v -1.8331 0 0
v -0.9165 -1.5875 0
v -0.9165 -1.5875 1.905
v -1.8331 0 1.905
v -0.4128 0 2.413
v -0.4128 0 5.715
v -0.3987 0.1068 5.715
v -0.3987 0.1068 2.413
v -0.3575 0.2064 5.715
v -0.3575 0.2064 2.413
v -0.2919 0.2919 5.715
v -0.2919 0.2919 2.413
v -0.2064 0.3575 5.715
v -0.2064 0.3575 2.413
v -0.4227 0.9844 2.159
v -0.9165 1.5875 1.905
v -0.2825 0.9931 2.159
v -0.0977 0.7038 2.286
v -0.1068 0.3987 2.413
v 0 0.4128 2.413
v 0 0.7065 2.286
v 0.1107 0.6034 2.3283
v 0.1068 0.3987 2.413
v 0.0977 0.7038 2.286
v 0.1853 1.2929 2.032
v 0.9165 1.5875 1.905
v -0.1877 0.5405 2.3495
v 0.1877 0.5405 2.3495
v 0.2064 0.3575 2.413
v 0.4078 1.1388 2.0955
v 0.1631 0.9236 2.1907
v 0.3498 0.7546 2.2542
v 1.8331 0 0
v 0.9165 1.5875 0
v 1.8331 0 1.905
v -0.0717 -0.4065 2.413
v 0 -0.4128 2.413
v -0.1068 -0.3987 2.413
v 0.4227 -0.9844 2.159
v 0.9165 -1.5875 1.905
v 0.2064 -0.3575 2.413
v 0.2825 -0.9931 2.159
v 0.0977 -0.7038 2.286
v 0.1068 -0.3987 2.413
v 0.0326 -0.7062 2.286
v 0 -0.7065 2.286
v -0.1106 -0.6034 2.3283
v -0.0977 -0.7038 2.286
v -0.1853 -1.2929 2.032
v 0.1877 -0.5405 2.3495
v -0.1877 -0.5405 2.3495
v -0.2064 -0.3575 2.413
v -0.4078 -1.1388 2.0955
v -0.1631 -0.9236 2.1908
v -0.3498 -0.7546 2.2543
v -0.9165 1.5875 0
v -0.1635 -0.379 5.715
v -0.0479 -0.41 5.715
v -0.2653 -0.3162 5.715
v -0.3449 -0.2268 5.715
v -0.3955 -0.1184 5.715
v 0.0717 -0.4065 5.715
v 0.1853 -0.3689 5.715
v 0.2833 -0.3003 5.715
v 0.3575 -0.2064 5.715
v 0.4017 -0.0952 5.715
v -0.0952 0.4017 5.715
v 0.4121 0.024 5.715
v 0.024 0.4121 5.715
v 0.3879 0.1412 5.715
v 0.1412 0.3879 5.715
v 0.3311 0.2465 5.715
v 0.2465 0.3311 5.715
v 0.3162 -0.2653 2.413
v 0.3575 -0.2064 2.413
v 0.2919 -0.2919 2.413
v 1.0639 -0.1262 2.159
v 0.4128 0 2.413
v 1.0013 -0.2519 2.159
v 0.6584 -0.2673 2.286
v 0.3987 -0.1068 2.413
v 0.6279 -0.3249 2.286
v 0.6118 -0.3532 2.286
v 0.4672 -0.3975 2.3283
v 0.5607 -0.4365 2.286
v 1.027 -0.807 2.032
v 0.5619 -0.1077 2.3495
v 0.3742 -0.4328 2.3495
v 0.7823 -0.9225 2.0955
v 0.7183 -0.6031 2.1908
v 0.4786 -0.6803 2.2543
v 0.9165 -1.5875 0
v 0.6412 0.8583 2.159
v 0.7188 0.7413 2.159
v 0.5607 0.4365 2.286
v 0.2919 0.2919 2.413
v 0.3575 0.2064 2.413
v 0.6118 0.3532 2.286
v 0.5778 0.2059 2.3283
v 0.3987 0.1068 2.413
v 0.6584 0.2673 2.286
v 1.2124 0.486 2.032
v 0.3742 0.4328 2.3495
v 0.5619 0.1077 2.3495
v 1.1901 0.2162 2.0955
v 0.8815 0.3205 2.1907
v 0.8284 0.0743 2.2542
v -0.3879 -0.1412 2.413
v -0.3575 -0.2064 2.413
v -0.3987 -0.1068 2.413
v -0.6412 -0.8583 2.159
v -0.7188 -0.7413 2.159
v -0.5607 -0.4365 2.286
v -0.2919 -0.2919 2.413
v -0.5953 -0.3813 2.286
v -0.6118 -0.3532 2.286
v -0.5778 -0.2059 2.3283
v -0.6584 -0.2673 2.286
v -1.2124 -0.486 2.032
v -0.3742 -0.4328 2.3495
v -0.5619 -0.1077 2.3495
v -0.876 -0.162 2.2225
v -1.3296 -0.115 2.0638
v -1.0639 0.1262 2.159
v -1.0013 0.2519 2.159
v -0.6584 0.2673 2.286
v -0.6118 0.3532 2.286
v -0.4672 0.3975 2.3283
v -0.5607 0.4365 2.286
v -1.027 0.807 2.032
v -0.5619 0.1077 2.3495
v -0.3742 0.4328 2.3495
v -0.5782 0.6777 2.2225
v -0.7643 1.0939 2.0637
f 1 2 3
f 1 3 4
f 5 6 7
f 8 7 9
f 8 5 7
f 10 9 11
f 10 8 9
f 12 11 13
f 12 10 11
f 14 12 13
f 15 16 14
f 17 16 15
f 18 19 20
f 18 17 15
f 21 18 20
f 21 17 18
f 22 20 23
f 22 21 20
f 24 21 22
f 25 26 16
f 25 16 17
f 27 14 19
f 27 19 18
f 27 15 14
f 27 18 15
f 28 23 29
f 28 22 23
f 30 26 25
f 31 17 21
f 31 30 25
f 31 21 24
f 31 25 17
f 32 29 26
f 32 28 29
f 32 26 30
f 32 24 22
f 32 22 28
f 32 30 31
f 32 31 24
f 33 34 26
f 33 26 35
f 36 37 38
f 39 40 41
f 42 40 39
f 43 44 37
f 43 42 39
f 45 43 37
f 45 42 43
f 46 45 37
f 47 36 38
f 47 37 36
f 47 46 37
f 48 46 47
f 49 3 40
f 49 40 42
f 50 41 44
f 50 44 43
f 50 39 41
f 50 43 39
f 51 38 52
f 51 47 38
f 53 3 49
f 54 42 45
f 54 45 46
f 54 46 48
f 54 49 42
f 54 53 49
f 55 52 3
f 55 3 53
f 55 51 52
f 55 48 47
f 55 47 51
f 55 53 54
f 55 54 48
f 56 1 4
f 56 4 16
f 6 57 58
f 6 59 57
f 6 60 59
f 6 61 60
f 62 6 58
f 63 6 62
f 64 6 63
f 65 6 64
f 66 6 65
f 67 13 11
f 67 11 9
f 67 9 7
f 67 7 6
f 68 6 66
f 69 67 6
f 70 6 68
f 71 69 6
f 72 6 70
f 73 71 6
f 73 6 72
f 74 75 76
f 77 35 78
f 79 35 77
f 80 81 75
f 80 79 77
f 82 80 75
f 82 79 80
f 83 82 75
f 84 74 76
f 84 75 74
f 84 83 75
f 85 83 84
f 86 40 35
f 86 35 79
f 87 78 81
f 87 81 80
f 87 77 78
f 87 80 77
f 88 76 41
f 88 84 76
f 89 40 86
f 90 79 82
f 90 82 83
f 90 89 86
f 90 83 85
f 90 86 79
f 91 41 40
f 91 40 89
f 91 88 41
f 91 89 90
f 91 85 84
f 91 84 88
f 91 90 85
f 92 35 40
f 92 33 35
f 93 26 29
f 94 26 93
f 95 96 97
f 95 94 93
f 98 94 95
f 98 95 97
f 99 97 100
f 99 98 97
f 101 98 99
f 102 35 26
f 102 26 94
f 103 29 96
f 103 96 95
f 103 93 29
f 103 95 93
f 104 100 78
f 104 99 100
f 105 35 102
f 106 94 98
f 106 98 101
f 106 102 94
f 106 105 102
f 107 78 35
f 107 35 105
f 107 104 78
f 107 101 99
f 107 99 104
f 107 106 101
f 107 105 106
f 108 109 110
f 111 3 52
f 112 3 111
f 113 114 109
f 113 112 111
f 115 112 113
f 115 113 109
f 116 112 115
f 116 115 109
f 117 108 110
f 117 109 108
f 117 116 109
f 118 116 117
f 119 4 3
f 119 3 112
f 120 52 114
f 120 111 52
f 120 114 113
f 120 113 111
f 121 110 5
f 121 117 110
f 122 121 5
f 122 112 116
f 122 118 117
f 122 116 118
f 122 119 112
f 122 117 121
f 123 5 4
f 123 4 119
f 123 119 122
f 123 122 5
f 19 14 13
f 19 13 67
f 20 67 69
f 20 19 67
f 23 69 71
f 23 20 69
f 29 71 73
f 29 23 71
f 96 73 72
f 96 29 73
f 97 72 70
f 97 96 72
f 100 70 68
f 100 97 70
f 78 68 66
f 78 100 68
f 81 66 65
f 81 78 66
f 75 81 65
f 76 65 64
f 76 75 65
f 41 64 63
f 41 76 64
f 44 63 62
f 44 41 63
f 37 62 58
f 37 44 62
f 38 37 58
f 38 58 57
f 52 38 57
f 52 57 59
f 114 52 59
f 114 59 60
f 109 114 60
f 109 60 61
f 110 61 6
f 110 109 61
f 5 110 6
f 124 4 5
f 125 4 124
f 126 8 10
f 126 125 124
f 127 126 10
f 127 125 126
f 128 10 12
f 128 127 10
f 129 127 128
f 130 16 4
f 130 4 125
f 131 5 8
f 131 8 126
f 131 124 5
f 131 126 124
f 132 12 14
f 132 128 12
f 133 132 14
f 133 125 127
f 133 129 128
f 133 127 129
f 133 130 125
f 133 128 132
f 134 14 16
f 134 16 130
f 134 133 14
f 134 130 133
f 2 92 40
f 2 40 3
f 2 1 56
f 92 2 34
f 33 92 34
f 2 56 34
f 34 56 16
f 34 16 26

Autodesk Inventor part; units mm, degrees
ref_plane "YZ Plane" through (0, 0, 0) normal (1, 0, 0) x (0, 1, 0)
ref_plane "XZ Plane" through (0, 0, 0) normal (0, 1, 0) x (-1, 0, 0)
ref_plane "XY Plane" through (0, 0, 0) normal (0, 0, 1) x (1, 0, 0)
sketch "Sketch1" plane through (0, 0, 0) normal (0, 0, 1) x (1, 0, 0)
  line L0 (-1.8331, 0) -> (-0.9165, 1.5875)
  line L1 (-0.9165, 1.5875) -> (0.9165, 1.5875)
  line L2 (0.9165, 1.5875) -> (1.8331, 0)
  line L3 (1.8331, 0) -> (0.9165, -1.5875)
  line L4 (0.9165, -1.5875) -> (-0.9165, -1.5875)
  line L5 (-0.9165, -1.5875) -> (-1.8331, 0)
  line L6 (0, -1.5875) -> (0, 1.5875) construction
  point P0 (0, 0)
  dimension "d1" = 0
  dimension "d3" = 120
  dimension "d7" = 3.175
extrude "Extrusion1" add sketch "Sketch1" along normal blind 1.905
sketch "Sketch2" plane through (0, 0, 1.905) normal (0, 0, 1) x (1, 0, 0)
  circle A0 centre (0, 0) radius 0.4128
  dimension "d6" = 0.8255
extrude "Extrusion2" add sketch "Sketch2" along normal blind 0.508
loft "Loft1" add section 1 edges at (-0.4128, 0, 2.413) section 2 edges at (0, -1.5875, 1.905) (1.3748, -0.7937, 1.905) (1.3748, 0.7938, 1.905) (0, 1.5875, 1.905) (-1.3748, 0.7937, 1.905) (-1.3748, -0.7938, 1.905)
sketch "Sketch3" plane through (0, 0, 2.413) normal (0, 0, 1) x (1, 0, 0)
  arc A0 (-0.2064, 0.3575) -> (-0.4128, 0) centre (0, 0) ccw projected
  circle A1 centre (0, 0) radius 0.4128
  arc A2 (0.4128, 0) -> (0.2064, 0.3575) centre (0, 0) ccw projected
  point P0 (0.3575, 0.2064)
  point P1 (-0.4128, 0)
  dimension "d15" = 0.8255
extrude "Extrusion3" add sketch "Sketch3" along normal blind 3.302
properties part number "FeedThroughCap"
